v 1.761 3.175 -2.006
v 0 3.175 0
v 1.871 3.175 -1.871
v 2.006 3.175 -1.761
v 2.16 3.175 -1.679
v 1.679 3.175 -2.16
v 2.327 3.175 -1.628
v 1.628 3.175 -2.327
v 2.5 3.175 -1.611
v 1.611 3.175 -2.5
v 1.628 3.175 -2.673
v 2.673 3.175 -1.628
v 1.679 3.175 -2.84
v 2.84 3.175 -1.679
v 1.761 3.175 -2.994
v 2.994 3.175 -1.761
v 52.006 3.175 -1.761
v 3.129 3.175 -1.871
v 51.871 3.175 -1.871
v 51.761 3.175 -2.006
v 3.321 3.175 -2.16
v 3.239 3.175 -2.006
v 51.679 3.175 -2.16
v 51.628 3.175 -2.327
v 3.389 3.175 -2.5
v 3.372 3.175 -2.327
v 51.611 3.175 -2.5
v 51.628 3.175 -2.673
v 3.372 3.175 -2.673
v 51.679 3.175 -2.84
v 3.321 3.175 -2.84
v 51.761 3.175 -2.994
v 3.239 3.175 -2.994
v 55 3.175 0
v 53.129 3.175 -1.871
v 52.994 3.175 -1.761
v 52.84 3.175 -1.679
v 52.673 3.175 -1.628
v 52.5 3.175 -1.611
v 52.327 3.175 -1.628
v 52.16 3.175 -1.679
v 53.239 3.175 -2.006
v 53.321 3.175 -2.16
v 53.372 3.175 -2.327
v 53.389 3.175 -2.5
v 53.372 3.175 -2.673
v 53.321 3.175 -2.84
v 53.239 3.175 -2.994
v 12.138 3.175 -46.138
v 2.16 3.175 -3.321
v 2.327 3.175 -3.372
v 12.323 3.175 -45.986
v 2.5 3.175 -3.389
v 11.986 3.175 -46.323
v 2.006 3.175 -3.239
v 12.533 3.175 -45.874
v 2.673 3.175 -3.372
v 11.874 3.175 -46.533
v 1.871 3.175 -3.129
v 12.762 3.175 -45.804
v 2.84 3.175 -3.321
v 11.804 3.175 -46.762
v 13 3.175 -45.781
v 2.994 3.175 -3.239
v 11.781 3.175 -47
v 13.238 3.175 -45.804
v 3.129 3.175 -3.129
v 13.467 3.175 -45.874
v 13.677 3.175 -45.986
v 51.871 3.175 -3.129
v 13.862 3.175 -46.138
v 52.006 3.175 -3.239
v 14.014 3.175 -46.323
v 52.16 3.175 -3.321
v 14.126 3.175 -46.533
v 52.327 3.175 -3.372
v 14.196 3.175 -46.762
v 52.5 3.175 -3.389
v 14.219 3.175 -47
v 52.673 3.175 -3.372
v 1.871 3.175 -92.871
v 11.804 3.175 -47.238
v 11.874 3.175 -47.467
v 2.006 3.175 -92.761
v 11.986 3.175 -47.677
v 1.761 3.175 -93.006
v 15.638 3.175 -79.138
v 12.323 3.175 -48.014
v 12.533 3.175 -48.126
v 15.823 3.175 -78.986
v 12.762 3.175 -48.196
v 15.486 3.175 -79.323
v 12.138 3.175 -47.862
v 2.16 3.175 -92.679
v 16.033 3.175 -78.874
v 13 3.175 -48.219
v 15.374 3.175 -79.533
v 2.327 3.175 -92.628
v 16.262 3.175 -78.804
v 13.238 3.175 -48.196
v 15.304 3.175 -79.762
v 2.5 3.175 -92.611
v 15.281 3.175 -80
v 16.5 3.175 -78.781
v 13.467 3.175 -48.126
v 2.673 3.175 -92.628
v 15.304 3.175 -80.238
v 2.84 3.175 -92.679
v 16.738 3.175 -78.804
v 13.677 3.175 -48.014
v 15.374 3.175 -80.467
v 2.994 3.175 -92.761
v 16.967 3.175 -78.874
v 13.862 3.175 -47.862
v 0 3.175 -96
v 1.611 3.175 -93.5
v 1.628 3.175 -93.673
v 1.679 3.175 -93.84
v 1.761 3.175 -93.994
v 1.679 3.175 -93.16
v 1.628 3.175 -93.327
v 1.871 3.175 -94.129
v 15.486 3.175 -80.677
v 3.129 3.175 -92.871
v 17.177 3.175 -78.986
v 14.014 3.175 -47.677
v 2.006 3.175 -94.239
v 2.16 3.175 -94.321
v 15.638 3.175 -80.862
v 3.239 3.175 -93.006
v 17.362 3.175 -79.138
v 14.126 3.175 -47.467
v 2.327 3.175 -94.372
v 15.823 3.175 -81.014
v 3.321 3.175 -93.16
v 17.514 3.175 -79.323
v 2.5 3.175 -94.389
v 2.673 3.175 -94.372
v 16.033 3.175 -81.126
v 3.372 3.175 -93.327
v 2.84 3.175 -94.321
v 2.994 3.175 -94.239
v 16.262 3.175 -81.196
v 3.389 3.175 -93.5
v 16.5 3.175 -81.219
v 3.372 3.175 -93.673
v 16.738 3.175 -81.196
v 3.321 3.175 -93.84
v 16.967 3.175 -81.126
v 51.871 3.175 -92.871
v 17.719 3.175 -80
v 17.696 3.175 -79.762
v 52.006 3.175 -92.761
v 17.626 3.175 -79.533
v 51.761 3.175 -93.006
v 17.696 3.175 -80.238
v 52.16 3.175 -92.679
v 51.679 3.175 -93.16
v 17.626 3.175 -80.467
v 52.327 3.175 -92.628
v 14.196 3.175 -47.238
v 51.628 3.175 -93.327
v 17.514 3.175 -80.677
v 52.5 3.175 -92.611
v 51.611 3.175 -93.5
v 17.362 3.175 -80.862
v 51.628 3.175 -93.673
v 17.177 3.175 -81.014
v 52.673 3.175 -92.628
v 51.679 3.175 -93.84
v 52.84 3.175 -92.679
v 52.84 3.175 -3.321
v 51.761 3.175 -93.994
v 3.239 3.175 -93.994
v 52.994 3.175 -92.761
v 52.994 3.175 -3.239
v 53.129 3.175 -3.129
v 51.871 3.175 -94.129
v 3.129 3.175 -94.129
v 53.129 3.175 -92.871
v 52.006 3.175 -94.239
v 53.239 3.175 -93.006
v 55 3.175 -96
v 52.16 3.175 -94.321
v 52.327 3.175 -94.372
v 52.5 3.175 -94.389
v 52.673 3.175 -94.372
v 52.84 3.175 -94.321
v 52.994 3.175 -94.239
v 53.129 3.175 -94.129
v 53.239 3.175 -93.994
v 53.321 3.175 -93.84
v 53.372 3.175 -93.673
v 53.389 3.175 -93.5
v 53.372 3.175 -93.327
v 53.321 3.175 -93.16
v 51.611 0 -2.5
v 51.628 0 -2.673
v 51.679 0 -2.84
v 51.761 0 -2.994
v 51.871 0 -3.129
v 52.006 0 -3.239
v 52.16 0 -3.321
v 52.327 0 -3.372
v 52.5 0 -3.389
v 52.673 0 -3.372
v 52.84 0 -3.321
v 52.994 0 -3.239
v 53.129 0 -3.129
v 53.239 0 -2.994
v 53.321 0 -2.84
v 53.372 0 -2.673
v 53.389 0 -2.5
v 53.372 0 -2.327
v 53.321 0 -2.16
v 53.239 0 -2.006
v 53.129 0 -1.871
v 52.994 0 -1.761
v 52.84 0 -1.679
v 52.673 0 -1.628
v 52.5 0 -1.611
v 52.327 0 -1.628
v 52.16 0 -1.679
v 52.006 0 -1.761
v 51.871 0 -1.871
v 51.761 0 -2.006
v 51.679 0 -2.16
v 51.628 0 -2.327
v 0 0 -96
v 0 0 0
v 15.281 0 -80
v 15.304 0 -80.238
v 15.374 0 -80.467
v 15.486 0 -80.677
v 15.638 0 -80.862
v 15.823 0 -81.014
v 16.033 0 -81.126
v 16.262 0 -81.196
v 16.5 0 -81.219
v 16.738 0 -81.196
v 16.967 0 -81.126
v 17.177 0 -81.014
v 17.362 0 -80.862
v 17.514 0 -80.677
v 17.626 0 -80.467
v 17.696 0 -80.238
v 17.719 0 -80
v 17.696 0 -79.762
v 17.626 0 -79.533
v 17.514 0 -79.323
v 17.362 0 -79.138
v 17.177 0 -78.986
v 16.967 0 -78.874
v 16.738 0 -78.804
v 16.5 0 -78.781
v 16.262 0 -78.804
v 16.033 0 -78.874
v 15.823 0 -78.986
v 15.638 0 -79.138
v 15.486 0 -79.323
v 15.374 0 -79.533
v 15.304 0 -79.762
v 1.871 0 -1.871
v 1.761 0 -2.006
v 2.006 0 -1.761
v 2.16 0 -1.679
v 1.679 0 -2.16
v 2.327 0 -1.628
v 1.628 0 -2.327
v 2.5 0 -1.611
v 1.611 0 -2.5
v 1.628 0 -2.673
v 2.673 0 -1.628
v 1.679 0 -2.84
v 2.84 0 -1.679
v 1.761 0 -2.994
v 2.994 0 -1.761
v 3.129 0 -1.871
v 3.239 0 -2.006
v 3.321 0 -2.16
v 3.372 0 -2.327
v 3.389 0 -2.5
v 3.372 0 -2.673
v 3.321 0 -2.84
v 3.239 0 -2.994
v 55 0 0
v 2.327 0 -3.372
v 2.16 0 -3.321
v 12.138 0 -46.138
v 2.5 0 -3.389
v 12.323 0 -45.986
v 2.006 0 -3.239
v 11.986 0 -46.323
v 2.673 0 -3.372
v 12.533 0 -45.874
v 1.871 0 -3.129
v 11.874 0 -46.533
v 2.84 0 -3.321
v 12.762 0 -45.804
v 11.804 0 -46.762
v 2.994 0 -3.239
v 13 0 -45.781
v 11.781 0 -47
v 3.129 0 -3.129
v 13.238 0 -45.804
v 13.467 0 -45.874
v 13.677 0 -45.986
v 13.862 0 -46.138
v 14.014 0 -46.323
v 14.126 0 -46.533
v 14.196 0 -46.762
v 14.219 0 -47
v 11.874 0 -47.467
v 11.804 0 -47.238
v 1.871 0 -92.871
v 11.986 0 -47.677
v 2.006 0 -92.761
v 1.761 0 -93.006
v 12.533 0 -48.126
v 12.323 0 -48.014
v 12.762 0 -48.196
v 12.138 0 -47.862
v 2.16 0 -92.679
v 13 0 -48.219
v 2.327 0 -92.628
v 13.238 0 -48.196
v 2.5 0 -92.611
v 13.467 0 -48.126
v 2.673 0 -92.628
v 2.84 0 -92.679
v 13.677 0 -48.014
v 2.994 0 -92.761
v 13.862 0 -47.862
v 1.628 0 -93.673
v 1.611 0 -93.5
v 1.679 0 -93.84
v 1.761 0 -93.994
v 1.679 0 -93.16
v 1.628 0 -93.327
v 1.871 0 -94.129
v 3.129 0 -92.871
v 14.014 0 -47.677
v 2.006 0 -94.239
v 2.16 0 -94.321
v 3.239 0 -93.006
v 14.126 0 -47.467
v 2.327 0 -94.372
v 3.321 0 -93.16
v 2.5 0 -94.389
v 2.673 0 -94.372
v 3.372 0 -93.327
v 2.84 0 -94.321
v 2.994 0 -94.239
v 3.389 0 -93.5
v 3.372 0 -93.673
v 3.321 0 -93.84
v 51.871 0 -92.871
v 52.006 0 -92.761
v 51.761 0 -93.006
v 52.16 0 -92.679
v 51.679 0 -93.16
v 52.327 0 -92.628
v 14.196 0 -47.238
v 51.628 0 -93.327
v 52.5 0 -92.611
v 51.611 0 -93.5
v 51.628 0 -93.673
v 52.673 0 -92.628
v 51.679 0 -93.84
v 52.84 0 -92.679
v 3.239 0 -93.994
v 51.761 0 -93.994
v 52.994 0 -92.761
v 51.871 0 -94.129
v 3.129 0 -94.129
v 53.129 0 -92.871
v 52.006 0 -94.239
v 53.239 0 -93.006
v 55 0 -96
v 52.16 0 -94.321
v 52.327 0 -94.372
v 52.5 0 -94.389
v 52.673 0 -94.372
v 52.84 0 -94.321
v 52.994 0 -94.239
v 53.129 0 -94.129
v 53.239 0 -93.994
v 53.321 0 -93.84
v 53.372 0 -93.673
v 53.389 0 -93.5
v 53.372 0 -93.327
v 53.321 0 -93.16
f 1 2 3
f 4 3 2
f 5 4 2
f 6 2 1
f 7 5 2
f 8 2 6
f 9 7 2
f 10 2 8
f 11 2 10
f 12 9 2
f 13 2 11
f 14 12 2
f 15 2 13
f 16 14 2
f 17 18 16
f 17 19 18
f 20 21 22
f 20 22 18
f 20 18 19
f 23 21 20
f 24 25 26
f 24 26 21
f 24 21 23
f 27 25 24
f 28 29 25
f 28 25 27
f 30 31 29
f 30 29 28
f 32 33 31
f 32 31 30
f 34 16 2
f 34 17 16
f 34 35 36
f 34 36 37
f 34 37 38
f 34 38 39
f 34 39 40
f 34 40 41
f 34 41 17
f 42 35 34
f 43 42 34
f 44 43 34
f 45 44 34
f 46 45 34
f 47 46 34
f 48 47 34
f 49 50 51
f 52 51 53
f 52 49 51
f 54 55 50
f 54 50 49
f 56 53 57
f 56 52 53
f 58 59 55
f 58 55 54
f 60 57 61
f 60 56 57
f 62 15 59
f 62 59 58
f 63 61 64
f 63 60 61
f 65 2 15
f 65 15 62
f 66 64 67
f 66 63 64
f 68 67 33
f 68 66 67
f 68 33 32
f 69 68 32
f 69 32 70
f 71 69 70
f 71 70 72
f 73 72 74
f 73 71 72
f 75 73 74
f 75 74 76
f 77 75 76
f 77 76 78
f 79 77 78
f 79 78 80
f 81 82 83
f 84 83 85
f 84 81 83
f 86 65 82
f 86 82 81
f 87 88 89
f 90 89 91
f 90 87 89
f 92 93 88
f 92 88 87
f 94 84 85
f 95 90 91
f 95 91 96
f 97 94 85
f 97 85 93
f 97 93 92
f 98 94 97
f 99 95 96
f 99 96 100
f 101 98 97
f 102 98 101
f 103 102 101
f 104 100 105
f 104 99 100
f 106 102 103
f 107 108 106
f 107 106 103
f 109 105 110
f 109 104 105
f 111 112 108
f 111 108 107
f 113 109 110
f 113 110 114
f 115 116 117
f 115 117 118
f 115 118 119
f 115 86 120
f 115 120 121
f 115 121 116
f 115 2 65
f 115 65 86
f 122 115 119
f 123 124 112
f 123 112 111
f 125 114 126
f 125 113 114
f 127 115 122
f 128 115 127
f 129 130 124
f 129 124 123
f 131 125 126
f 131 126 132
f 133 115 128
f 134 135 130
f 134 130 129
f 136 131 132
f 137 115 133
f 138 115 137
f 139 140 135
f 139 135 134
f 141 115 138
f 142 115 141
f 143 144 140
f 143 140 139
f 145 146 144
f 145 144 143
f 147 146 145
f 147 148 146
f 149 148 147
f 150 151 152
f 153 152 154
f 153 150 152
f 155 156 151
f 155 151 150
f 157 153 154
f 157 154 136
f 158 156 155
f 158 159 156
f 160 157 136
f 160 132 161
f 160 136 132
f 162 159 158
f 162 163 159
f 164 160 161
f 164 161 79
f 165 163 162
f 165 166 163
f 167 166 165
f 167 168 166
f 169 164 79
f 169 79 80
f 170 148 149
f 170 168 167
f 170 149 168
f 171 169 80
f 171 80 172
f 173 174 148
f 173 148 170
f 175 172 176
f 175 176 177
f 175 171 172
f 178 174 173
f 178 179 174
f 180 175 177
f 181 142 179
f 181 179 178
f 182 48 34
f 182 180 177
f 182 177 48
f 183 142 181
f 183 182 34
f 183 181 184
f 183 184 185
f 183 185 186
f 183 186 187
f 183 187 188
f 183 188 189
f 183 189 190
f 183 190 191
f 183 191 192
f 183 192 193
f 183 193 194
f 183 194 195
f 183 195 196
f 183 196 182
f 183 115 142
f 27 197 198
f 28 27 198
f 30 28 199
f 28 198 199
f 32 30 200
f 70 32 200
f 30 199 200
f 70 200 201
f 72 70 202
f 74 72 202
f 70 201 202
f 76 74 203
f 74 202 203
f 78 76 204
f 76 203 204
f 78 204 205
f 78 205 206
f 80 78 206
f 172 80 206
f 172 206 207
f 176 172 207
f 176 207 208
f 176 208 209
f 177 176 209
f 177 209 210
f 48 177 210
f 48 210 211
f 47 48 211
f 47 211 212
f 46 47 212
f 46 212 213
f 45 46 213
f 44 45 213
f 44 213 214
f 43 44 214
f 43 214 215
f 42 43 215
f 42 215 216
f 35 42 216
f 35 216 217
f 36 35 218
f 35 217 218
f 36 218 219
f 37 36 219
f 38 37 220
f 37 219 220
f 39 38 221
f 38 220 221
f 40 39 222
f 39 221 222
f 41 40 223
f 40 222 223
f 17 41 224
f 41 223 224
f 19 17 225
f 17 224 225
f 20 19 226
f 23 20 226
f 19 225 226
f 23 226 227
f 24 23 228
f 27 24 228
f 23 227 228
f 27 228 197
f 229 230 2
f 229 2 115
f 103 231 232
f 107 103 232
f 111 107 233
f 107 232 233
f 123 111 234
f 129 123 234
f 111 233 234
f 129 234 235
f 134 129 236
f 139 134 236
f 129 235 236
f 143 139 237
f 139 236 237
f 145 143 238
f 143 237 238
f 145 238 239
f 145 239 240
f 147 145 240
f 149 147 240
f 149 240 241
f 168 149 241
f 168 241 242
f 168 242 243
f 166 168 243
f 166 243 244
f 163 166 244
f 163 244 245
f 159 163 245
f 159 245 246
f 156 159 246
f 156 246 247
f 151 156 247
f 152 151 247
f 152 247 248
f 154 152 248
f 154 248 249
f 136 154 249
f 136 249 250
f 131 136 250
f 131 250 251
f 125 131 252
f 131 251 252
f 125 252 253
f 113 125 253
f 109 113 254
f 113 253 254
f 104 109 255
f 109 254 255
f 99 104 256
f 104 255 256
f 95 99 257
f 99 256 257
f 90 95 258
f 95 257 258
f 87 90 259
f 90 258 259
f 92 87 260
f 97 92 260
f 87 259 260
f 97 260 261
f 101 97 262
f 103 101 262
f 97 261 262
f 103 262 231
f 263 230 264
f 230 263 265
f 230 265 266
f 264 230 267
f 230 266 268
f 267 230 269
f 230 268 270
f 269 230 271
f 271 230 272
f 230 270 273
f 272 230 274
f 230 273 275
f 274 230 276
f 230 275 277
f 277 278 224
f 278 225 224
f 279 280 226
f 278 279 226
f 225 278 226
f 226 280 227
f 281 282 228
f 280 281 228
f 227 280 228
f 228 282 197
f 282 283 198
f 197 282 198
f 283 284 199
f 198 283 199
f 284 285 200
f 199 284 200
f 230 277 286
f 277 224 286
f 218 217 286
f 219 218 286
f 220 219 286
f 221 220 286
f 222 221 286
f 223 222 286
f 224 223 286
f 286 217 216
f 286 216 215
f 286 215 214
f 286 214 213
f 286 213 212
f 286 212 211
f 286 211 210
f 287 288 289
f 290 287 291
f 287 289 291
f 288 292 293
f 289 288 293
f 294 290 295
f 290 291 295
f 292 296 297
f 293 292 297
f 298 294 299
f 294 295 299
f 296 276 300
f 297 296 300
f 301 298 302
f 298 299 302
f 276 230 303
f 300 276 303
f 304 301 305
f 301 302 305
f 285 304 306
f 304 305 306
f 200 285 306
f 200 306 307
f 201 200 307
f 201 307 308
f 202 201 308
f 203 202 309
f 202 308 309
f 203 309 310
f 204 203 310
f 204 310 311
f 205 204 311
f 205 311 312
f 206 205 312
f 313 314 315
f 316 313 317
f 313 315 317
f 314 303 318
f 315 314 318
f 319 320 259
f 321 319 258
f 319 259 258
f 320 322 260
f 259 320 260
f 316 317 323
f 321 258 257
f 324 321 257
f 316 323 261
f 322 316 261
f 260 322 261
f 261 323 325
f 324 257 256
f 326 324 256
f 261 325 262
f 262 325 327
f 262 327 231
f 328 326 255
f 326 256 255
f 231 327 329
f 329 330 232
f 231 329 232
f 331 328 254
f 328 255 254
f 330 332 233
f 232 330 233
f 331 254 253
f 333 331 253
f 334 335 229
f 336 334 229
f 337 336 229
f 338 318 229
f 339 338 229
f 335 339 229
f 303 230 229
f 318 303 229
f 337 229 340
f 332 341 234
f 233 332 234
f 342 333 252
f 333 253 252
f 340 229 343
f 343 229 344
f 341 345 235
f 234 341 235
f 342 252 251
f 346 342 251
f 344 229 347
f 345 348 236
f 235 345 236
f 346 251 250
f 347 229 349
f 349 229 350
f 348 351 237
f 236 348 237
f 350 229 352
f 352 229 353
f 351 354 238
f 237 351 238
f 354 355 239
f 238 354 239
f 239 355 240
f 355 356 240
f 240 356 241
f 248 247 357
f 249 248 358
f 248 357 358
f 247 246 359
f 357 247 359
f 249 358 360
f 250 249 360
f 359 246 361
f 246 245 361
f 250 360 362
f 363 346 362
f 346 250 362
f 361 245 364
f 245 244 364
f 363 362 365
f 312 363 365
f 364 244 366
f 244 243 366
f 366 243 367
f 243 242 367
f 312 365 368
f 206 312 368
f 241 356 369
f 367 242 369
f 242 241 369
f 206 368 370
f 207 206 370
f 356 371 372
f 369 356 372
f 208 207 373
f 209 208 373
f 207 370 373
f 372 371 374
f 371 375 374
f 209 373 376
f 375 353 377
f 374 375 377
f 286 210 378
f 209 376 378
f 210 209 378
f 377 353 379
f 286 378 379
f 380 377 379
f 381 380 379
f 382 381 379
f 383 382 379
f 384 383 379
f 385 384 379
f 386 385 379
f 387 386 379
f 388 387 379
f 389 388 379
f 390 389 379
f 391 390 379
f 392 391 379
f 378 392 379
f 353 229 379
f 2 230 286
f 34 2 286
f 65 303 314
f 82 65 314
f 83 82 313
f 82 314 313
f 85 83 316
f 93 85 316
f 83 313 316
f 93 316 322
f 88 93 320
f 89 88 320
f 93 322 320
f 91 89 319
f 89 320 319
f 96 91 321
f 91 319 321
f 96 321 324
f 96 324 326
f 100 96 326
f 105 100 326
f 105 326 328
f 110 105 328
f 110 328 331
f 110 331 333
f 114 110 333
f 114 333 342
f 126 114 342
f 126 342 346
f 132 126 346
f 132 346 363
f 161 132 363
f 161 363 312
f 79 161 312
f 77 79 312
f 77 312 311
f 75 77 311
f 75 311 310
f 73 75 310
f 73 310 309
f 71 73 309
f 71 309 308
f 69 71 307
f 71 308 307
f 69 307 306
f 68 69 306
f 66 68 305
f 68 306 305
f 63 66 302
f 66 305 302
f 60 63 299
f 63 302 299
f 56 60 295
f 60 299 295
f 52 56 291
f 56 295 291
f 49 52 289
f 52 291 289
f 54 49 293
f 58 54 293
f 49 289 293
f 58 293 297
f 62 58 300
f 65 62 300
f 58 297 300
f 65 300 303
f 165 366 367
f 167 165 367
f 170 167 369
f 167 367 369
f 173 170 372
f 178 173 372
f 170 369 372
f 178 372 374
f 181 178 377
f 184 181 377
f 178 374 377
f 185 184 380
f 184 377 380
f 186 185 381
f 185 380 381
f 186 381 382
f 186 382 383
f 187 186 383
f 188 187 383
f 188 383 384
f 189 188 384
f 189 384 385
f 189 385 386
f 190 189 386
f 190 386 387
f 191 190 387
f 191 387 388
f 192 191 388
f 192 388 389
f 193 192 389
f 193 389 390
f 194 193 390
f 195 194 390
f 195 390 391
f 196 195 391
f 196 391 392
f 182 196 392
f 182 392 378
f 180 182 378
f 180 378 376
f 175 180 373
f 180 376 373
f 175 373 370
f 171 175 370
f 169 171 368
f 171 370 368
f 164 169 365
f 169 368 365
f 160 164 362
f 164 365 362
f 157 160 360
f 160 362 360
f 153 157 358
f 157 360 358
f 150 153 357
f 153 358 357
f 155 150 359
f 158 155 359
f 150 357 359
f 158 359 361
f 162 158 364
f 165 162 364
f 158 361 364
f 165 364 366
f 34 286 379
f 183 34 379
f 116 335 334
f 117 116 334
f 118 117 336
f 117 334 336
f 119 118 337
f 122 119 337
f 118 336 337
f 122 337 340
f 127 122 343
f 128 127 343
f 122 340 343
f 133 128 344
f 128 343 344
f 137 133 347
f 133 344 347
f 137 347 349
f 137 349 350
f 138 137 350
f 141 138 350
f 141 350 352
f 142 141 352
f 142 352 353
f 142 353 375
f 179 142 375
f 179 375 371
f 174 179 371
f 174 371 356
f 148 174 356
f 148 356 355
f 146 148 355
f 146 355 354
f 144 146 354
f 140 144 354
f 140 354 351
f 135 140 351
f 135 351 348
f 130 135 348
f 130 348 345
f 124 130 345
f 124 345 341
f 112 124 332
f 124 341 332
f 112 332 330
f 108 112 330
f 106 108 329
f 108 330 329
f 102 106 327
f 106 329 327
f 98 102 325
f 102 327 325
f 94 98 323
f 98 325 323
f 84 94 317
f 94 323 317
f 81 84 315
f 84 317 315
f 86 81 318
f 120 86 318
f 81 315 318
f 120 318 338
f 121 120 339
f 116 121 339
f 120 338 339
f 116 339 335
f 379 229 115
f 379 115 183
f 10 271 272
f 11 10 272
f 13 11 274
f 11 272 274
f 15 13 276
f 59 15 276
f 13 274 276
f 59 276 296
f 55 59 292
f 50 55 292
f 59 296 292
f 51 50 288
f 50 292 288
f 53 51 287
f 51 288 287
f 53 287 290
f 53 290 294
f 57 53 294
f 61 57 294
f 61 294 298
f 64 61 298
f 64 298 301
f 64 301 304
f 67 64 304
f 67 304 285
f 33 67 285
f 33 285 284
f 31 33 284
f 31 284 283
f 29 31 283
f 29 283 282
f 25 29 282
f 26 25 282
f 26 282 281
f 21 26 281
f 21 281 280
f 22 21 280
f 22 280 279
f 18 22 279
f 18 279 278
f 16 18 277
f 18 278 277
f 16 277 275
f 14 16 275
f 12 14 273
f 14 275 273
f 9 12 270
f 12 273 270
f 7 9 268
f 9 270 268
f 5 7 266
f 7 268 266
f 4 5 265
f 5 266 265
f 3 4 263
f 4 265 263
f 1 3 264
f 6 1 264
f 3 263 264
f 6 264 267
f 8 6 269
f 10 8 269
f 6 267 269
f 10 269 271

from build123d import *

# Parameters (mm, degrees)
SKETCH2_W             = 55
SKETCH2_H             = 96
BOSS_EXTRUDE1_DEPTH   = 3.175
F_2_CLEARANCE_HOLE1_D = 2.4384
F_0_CLEARANCE_HOLE1_D = 1.778


with BuildPart() as part:
    # Sketch2 → Boss-Extrude1 (new body)
    with BuildSketch(Plane(origin=(0, 0, 0), x_dir=(1, 0, 0), z_dir=(0, 1, 0))):
        with Locations((27.5, 48)):
            Rectangle(SKETCH2_W, SKETCH2_H)
    extrude(amount=BOSS_EXTRUDE1_DEPTH)

    # #2 Clearance Hole1 (through all)
    with Locations(Plane(origin=(0, 3.175, 0), x_dir=(1, 0, 0), z_dir=(0, 1, 0))):
        with Locations((16.5, 80), (13, 47)):
            Hole(F_2_CLEARANCE_HOLE1_D / 2)

    # #0 Clearance Hole1 (through all)
    with Locations(Plane(origin=(0, 3.175, 0), x_dir=(1, 0, 0), z_dir=(0, 1, 0))):
        with Locations((2.5, 2.5), (52.5, 2.5), (52.5, 93.5), (2.5, 93.5)):
            Hole(F_0_CLEARANCE_HOLE1_D / 2)


solid = part.part
